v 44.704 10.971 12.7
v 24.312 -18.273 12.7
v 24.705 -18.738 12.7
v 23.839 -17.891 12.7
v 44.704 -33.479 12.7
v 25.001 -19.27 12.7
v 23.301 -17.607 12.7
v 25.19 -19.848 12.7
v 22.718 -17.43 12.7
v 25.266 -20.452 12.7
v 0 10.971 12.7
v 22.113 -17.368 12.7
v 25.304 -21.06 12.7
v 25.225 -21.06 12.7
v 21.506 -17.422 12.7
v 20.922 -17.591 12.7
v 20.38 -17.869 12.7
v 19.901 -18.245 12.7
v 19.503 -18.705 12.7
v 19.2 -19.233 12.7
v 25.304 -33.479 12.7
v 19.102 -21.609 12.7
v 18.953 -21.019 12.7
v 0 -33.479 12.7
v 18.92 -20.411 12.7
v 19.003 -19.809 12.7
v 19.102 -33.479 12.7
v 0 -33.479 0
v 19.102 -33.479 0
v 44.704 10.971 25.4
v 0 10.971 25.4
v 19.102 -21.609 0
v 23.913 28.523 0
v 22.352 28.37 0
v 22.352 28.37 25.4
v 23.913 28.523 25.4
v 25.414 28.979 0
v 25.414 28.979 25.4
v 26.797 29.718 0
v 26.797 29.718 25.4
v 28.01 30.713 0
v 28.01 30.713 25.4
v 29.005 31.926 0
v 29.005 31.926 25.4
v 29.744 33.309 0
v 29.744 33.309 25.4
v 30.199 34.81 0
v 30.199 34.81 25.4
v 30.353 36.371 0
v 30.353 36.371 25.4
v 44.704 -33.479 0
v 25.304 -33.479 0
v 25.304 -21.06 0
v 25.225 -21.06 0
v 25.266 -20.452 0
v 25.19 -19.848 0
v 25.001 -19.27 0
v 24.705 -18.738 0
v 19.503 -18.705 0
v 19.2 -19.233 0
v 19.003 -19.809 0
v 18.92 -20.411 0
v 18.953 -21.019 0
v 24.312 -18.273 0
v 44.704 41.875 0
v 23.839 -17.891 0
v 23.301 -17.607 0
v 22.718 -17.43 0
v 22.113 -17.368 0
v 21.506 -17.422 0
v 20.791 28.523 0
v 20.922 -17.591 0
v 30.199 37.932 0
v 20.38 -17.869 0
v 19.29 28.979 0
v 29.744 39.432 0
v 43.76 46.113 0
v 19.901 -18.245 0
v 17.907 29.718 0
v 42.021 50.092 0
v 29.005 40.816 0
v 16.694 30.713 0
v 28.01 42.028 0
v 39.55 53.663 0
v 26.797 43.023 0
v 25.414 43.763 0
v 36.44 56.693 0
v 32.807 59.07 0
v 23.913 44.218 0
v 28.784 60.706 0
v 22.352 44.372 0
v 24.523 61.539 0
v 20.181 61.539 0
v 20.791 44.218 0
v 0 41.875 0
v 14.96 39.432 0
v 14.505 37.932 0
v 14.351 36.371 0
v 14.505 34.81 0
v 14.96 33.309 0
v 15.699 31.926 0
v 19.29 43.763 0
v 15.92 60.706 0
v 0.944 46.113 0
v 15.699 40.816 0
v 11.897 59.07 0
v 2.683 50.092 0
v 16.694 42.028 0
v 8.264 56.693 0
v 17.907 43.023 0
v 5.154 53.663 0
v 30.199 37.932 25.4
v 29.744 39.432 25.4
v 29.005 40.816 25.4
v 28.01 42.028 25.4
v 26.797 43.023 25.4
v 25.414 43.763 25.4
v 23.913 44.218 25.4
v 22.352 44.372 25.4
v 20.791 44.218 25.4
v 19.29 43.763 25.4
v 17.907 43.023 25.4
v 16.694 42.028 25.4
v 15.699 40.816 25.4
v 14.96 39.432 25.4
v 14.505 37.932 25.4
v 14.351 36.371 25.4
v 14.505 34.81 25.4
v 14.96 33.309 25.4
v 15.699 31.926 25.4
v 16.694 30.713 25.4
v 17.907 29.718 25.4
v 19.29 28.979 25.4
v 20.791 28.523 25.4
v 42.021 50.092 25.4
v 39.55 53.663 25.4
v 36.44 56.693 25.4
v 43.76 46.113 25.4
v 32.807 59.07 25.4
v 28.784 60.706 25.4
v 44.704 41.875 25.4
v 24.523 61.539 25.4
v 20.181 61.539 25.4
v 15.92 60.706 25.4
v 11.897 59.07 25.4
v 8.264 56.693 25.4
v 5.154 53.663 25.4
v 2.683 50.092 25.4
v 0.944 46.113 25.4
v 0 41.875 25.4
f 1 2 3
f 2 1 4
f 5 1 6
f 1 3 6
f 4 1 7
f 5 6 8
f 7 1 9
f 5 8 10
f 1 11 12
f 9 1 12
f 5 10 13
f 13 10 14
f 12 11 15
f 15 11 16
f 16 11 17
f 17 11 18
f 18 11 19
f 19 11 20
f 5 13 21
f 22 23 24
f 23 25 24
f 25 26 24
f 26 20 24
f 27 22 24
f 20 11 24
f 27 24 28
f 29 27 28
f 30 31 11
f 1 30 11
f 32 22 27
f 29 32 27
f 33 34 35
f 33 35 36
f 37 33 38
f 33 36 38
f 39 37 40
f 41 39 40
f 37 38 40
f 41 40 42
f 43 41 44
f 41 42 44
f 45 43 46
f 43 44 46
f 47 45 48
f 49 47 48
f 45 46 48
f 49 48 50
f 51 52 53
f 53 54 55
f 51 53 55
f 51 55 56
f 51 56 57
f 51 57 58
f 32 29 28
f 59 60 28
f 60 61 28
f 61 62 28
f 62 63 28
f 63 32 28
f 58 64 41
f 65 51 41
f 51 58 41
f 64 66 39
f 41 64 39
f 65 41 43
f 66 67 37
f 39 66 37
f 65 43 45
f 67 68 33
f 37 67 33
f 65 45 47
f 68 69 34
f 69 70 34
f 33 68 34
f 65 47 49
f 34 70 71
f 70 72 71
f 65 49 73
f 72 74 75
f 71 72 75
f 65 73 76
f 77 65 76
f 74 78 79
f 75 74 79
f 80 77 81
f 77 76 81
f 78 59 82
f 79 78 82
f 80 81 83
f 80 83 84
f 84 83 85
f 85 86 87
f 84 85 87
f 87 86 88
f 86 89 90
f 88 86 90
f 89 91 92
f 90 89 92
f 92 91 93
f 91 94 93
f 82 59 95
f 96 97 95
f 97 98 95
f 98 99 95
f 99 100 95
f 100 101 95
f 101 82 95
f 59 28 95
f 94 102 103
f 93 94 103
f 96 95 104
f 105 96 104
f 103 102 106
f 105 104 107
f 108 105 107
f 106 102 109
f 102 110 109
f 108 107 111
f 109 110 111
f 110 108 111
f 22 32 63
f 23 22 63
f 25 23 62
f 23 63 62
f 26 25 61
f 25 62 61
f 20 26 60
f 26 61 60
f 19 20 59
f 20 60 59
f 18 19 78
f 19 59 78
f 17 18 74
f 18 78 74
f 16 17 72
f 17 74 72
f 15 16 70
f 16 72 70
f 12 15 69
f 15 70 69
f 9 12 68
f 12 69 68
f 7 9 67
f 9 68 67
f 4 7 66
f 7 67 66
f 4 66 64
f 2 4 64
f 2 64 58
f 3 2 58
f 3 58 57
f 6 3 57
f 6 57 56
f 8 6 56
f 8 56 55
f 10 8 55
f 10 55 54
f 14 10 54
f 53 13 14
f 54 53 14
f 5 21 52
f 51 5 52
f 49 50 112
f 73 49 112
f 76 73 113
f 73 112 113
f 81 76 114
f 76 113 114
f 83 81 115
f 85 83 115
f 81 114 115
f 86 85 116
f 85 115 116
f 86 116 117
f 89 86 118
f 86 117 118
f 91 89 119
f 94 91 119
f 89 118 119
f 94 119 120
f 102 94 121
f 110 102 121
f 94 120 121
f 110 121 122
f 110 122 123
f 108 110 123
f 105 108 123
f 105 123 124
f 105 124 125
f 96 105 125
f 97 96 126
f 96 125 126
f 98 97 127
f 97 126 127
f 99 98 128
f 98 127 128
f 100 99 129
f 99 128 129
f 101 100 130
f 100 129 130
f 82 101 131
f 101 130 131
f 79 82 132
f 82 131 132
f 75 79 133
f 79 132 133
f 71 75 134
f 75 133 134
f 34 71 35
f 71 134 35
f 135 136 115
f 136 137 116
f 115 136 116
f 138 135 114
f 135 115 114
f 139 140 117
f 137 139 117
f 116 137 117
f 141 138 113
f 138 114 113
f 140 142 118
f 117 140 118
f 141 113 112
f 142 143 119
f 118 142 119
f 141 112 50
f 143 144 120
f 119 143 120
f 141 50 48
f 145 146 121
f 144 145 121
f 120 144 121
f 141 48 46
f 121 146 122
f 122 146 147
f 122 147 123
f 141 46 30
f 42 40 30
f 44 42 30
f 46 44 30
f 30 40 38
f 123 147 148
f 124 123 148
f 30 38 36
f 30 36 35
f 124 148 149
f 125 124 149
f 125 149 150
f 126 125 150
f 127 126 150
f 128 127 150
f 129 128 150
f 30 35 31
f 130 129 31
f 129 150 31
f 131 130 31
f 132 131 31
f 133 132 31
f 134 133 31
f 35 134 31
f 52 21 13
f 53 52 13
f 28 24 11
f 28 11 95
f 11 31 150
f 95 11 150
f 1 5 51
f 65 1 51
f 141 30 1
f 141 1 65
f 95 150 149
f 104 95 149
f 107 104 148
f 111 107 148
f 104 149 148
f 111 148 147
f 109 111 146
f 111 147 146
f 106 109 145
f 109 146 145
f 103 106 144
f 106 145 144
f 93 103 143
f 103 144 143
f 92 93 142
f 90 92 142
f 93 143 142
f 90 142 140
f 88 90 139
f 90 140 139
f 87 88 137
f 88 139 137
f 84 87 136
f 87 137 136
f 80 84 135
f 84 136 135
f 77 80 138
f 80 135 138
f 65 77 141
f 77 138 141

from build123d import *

# Parameters (mm, degrees)
F1_DEPTH  = 44.704
F4_D      = 6.35
F4_DEPTH  = 50.8
F6_DEPTH  = 25.4
F8_DEPTH  = 25.4
F10_DEPTH = 25.4


with BuildPart() as f1:
    # F0 (on Right) → F1 (new body)
    with BuildSketch(Plane.YZ):
        Polygon((-33.479363, 12.7), (-33.479363, 0), (61.770637, 0), (61.770637, 25.4), (10.970637, 25.4), (10.970637, 12.7), align=None)
    extrude(amount=F1_DEPTH)

    # F4
    with Locations(Plane.XY.offset(12.7)):
        with Locations((22.09222, -20.542669)):
            Hole(F4_D / 2, depth=F4_DEPTH)

    # F5 (on face) → F6 (cut)
    with BuildSketch(Plane.XY.offset(12.7)):
        Polygon((25.304057, -21.059527), (19.101784, -21.059527), (19.101784, -33.980933), (25.304057, -33.759527), align=None)
    extrude(amount=-F6_DEPTH, mode=Mode.SUBTRACT)

    # F7 (on face) → F8 (cut)
    with BuildSketch(Plane.XY.offset(25.4)):
        with BuildLine():
            ThreePointArc((0, 41.87514), (22.352, 61.643697), (44.704, 41.87514))
            Line((44.704, 41.87514), (44.704, 61.770637))
            Line((44.704, 61.770637), (0, 61.770637))
            Line((0, 61.770637), (0, 41.87514))
        make_face()
    extrude(amount=-F8_DEPTH, mode=Mode.SUBTRACT)

    # F9 (on face) → F10 (cut)
    with BuildSketch(Plane.XY.offset(25.4)):
        with BuildLine():
            ThreePointArc((30.353, 36.370637), (16.694439, 42.028199), (22.352, 28.369637))
            ThreePointArc((22.352, 28.369637), (28.009561, 30.713076), (30.353, 36.370637))
        make_face()
    extrude(amount=-F10_DEPTH, mode=Mode.SUBTRACT)


solid = f1.part
